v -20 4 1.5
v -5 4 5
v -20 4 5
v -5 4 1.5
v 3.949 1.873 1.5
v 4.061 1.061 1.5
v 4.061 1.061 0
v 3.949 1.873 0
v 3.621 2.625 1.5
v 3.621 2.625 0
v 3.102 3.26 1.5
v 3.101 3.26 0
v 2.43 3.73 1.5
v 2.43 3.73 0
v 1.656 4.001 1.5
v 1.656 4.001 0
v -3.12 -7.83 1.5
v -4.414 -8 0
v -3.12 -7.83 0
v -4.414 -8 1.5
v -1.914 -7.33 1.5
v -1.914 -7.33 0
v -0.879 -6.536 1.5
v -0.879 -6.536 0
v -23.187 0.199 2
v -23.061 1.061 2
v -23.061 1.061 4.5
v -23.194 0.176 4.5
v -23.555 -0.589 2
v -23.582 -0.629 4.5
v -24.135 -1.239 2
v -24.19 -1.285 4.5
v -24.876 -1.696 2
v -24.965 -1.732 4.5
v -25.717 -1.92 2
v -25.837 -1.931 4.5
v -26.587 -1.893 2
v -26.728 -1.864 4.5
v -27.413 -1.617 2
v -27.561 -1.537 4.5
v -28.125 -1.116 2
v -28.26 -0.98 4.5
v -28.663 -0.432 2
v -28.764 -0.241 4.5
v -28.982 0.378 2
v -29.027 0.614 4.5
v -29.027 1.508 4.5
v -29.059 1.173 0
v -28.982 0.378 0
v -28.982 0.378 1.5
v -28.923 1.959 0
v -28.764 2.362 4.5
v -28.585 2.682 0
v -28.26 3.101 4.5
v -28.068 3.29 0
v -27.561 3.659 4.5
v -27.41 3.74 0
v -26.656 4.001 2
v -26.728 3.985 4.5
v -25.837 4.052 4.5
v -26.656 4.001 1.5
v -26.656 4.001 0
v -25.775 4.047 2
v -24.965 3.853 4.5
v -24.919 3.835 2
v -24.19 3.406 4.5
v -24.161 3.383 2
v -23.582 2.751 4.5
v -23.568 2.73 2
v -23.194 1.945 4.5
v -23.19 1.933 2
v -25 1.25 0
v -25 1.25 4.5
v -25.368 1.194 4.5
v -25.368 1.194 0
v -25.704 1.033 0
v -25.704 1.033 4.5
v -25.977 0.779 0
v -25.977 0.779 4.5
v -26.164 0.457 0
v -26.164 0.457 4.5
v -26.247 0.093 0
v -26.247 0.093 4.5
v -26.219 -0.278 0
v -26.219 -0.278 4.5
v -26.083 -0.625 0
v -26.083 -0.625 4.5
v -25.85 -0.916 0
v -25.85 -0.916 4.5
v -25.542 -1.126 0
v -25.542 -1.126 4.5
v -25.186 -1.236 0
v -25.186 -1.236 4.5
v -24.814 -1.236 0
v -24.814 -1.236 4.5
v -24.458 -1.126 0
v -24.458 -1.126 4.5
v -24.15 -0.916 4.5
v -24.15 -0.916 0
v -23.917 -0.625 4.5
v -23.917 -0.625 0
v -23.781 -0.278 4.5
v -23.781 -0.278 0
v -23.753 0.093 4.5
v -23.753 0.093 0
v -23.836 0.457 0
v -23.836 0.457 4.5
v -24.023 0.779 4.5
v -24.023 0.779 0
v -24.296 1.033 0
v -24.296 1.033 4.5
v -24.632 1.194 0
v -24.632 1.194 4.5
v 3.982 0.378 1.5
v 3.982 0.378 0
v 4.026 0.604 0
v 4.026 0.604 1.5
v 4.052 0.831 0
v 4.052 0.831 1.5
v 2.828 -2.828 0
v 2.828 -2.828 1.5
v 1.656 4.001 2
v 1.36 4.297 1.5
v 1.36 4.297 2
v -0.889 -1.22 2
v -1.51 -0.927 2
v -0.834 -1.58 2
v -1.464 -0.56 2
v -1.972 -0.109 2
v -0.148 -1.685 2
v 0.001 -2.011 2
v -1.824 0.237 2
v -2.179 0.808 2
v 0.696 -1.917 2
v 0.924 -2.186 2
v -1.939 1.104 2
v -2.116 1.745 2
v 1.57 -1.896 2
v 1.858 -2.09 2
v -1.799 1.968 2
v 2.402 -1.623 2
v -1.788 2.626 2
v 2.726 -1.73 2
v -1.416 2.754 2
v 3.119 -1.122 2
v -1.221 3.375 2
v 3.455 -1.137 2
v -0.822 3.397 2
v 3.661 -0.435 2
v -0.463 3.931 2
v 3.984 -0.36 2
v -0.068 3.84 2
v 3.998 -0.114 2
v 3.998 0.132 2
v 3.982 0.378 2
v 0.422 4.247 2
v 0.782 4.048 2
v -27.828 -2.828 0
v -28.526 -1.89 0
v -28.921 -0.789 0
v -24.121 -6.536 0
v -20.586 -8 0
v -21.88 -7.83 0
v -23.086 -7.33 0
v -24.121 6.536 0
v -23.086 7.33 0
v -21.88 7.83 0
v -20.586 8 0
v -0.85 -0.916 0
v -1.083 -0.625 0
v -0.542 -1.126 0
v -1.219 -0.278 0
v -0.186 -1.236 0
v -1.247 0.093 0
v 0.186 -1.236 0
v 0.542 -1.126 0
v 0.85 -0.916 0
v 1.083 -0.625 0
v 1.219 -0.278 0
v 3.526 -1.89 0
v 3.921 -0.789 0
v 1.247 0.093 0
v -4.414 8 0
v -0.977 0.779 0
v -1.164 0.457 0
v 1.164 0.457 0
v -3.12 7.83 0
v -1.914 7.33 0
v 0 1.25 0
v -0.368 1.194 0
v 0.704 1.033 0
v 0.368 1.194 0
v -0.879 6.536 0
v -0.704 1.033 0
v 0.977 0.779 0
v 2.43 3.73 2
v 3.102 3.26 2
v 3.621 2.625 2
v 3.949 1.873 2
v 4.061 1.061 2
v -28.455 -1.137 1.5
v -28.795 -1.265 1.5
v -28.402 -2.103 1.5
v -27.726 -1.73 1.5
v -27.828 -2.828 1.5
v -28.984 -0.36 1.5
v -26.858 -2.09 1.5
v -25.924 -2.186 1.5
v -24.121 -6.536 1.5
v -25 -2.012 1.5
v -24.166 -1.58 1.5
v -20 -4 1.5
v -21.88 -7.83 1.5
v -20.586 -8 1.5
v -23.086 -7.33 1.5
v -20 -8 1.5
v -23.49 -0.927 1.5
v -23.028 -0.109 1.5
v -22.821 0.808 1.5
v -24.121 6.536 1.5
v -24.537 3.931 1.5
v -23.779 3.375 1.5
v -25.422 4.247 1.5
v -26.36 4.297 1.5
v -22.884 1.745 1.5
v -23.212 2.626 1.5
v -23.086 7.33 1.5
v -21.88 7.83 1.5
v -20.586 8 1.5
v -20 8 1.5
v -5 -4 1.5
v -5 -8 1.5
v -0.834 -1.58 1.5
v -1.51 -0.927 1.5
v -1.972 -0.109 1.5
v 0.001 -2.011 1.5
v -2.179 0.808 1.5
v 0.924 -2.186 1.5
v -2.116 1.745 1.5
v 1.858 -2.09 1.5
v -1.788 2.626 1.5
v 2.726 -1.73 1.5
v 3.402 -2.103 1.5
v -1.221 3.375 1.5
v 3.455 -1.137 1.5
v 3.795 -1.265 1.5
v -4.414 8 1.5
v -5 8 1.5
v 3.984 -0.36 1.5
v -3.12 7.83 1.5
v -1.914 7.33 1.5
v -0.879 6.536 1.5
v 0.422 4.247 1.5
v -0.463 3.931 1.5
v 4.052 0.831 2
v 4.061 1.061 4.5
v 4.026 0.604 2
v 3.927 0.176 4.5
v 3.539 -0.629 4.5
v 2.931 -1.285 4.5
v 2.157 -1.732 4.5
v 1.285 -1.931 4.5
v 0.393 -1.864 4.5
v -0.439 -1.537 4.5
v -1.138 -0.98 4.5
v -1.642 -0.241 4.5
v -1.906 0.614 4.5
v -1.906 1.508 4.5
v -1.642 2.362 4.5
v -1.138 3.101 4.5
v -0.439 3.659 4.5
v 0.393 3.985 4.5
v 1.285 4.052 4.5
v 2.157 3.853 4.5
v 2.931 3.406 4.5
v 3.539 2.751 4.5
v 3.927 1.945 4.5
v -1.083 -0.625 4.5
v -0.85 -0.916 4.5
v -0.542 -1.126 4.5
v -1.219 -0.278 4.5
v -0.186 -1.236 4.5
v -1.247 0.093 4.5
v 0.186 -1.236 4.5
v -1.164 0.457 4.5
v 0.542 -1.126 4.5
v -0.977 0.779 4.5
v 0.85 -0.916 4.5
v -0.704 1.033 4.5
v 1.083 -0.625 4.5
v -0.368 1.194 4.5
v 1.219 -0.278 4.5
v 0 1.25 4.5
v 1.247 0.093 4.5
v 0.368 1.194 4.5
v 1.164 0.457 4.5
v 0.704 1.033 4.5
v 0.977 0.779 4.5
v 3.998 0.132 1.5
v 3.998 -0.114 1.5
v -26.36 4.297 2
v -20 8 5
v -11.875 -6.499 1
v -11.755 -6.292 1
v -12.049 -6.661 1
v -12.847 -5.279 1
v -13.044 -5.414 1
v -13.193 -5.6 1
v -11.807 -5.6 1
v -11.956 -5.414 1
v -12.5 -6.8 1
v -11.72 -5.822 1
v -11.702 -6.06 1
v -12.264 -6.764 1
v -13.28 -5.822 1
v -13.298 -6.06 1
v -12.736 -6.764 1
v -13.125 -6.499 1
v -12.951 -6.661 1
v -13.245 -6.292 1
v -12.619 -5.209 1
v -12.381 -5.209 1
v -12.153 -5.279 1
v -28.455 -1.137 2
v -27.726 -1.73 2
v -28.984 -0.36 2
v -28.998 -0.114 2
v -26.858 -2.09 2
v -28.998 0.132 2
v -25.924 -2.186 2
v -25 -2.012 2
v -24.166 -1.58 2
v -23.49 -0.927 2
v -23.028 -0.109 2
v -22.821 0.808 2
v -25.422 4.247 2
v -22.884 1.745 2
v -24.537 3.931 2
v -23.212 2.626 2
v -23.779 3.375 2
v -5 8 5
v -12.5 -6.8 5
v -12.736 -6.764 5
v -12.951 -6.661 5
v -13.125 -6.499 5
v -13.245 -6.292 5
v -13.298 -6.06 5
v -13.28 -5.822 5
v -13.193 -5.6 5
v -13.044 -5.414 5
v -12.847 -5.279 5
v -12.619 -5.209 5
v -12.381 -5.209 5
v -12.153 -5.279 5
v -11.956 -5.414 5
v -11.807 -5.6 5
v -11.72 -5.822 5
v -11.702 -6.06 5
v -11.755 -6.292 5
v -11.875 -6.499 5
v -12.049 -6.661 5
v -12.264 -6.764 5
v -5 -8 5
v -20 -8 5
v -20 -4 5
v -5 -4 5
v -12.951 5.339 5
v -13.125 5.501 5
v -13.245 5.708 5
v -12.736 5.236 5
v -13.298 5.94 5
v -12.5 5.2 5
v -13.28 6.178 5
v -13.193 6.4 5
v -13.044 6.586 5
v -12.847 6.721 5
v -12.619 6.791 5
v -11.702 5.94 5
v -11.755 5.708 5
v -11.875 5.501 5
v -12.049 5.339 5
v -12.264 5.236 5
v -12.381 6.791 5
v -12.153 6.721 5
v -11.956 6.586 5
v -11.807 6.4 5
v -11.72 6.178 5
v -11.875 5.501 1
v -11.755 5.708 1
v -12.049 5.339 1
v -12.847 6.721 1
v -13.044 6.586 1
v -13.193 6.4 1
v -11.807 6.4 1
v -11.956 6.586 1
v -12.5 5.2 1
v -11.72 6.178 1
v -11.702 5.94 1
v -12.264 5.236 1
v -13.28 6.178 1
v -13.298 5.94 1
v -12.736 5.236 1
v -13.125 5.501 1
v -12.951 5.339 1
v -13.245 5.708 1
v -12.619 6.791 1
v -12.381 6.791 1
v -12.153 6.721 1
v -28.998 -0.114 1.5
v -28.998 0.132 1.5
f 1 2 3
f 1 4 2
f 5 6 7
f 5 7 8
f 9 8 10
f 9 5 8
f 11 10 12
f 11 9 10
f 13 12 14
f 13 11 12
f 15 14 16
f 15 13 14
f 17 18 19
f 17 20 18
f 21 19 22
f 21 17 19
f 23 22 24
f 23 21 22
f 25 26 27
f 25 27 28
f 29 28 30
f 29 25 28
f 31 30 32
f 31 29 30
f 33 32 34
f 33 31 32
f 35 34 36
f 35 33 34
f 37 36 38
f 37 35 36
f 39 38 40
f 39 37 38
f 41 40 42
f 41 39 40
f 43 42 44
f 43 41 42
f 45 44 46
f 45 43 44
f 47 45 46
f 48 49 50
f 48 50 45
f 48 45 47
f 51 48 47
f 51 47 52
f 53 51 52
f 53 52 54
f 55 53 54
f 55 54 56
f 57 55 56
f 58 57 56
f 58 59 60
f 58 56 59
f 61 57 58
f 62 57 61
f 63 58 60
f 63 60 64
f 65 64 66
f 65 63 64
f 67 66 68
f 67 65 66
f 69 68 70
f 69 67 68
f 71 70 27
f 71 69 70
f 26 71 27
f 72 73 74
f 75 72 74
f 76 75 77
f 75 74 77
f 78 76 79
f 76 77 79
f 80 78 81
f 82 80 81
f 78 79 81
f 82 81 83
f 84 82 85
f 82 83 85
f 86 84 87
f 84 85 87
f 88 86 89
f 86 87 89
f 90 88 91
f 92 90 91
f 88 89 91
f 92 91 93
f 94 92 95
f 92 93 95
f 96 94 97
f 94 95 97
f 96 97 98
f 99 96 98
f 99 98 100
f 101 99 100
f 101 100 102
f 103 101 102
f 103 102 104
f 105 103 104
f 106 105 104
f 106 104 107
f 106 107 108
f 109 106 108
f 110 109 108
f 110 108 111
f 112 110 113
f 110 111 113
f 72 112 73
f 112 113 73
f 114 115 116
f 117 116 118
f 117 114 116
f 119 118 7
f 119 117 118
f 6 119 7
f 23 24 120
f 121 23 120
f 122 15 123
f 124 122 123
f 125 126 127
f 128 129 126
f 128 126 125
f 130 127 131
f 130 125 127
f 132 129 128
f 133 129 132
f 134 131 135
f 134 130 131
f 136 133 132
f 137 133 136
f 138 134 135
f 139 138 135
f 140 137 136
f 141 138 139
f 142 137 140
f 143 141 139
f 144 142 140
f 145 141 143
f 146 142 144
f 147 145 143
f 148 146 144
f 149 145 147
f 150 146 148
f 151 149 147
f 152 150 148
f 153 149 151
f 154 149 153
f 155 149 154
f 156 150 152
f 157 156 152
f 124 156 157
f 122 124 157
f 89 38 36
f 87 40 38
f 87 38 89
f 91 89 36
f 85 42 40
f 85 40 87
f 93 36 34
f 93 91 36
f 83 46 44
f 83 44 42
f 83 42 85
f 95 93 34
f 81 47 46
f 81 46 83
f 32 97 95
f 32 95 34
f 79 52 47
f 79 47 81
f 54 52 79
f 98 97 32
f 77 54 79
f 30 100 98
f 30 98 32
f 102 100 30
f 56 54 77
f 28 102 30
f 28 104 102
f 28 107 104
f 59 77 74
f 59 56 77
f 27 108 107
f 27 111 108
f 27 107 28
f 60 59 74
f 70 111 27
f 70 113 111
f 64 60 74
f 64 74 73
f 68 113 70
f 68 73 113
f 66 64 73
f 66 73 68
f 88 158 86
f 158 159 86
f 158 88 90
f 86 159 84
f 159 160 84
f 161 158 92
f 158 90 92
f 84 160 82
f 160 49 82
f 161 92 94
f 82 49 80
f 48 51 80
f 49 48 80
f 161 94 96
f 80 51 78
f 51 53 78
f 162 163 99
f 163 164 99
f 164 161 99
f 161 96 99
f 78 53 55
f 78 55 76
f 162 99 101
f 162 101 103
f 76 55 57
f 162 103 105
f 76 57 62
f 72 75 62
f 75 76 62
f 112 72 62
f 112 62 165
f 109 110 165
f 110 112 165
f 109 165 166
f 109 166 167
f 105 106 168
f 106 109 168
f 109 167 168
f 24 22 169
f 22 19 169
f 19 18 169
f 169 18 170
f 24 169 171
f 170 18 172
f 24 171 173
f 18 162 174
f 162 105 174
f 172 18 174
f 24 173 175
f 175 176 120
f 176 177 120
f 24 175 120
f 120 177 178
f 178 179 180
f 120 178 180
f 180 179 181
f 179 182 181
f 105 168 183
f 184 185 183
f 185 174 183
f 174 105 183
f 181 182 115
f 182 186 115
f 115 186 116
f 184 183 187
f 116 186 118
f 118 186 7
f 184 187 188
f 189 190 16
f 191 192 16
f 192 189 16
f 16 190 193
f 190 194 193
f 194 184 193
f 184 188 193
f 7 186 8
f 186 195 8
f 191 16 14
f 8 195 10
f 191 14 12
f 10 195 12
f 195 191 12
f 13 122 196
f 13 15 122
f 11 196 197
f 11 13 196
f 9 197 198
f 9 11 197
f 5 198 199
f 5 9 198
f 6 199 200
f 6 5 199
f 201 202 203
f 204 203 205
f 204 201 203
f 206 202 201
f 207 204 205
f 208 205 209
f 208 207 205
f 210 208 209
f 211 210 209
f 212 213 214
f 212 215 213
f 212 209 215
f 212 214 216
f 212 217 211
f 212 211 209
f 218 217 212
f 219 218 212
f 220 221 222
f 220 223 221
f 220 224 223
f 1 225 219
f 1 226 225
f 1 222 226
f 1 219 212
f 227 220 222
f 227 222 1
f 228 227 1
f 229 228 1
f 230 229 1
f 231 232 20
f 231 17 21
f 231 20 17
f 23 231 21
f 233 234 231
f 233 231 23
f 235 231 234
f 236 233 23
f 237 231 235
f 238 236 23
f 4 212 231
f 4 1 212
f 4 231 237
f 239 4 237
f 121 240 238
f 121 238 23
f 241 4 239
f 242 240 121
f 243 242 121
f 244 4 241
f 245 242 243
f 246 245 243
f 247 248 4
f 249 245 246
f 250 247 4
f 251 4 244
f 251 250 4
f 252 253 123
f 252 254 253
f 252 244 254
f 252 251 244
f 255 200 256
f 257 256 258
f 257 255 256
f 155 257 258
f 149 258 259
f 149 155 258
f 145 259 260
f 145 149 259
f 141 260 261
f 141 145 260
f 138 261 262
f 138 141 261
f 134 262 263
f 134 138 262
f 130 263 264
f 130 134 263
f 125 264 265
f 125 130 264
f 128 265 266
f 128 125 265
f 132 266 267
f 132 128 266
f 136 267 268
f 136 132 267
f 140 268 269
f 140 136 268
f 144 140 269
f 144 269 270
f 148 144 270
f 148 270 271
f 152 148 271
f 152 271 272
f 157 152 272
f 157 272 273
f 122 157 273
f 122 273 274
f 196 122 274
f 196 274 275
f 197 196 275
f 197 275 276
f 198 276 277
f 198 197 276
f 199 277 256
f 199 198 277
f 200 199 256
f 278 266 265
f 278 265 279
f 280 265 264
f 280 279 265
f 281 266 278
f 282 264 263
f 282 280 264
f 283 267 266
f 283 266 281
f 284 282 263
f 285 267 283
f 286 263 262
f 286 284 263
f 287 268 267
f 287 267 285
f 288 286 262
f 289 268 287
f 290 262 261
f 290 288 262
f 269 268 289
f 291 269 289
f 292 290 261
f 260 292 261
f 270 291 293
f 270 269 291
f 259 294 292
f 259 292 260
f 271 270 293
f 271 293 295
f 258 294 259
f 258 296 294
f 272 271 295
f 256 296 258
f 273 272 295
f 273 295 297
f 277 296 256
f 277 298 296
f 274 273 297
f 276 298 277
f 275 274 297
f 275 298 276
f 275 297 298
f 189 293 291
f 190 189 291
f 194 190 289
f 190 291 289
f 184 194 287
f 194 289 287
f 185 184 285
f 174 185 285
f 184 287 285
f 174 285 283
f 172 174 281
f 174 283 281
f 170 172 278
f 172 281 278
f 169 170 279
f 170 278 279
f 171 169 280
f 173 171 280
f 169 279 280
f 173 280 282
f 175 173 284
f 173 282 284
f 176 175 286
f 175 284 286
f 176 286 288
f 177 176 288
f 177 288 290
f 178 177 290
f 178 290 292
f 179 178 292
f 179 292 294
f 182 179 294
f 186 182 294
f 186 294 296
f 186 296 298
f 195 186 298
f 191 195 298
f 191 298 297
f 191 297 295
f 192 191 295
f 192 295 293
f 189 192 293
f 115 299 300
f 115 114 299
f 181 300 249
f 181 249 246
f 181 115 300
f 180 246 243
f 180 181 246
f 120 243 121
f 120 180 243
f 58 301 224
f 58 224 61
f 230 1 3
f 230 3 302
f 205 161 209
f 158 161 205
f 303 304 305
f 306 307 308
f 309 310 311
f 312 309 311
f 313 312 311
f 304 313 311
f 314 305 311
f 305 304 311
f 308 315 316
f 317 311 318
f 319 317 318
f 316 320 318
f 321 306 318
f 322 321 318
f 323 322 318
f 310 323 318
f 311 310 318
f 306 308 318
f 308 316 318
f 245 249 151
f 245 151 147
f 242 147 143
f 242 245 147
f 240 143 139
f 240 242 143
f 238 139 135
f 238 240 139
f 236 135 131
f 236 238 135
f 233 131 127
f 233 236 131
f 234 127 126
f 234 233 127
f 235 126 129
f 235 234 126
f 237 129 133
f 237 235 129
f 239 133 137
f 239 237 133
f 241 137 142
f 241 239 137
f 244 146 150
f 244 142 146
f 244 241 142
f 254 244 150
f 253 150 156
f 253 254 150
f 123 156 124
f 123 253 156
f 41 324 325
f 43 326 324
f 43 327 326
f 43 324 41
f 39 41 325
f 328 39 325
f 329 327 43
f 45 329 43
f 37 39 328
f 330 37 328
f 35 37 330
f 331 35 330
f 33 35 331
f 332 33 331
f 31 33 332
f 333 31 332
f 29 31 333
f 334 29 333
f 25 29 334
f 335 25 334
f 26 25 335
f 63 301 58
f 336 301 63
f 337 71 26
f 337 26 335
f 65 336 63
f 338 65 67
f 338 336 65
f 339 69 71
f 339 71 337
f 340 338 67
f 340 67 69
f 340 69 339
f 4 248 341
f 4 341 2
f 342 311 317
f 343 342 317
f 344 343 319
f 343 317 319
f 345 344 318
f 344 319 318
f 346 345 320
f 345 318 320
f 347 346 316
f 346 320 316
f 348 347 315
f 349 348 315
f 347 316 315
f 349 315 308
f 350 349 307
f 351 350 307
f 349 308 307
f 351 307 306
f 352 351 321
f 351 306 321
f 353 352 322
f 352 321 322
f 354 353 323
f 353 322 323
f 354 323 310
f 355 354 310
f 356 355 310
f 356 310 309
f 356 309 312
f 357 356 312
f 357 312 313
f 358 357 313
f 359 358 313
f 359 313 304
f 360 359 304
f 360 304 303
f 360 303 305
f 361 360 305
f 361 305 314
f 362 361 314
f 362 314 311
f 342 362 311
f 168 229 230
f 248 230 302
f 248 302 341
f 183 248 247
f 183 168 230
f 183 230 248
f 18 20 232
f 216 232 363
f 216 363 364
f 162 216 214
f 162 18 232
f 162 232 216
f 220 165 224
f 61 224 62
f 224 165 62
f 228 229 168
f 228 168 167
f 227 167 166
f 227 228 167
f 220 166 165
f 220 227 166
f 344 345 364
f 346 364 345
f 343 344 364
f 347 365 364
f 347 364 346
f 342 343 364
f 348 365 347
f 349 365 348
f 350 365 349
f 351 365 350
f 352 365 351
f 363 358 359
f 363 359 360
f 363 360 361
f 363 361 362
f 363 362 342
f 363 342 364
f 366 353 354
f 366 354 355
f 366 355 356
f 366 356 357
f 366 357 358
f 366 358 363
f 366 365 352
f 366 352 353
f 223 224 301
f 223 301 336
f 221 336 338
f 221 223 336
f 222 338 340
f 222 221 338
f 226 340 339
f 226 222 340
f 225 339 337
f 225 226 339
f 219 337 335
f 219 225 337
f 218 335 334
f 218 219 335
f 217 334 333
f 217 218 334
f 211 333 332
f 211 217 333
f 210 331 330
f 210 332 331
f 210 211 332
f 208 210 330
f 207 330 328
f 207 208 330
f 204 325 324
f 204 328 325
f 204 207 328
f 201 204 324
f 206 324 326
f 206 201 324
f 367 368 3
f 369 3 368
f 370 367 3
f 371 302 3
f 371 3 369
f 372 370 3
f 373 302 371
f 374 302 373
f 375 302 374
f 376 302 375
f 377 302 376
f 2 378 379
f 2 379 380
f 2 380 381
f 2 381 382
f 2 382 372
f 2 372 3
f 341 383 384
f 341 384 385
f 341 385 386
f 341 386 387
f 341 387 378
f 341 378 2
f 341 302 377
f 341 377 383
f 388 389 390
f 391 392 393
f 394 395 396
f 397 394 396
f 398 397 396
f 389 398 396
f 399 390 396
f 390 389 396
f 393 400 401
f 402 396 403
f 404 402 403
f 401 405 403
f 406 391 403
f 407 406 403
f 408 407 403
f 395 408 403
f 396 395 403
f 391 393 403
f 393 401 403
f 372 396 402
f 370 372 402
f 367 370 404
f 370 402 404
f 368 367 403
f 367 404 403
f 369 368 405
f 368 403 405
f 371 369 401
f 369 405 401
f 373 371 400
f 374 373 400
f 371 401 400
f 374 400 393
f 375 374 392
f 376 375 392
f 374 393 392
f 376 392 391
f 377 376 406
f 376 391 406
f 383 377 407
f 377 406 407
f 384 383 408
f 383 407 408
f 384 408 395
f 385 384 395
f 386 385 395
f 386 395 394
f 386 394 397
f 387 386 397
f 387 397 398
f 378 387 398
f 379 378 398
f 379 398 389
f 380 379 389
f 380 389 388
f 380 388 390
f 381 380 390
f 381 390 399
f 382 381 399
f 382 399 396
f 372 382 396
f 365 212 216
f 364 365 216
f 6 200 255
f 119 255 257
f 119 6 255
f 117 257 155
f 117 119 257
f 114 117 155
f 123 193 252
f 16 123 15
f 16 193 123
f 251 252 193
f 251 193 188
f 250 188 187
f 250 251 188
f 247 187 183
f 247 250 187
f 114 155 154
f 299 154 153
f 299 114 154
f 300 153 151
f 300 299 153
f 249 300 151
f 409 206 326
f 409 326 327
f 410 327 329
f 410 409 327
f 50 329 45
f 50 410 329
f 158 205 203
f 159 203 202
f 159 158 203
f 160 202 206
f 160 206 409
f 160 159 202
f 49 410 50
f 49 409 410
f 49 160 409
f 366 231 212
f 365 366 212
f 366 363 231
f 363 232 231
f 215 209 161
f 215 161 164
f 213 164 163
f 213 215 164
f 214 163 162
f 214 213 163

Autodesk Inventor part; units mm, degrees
ref_plane "YZ Plane" through (0, 0, 0) normal (1, 0, 0) x (0, 1, 0)
ref_plane "XZ Plane" through (0, 0, 0) normal (0, 1, 0) x (-1, 0, 0)
ref_plane "XY Plane" through (0, 0, 0) normal (0, 0, 1) x (1, 0, 0)
sketch "axes" plane through (0, 0, 0) normal (0, 0, 1) x (1, 0, 0)
  point P0 (0, 0)
  point P1 (0, 0)
  point P2 (-25, 0)
  dimension "d0" = 25
sketch "Sketch2" plane through (0, 0, 0) normal (0, 0, 1) x (1, 0, 0)
  circle A0 centre (-25, 0) radius 4
  circle A1 centre (0, 0) radius 4
  line L0 (-22.6569, 8) -> (-2.3431, 8)
  line L1 (-2.3431, -8) -> (-22.6569, -8)
  line L2 (-22.6569, -8) -> (-27.8284, -2.8284)
  line L3 (-22.6569, 8) -> (-27.8284, 2.8284)
  line L4 (-2.3431, 8) -> (2.8284, 2.8284)
  line L5 (-2.3431, -8) -> (2.8284, -2.8284)
  line L6 (-25, 0) -> (0, 0) construction
  dimension "d1" = 8
  dimension "d2" = 8
  dimension "d3" = 16
  dimension "d4" = 45
  dimension "d5" = 45
extrude "baseplate" add sketch "Sketch2" along normal blind 1.5
sketch "Sketch3" plane through (0, 0, 1.5) normal (0, 0, 1) x (1, 0, 0)
  arc A0 (-27.8284, 2.8284) -> (-27.8284, -2.8284) centre (-25, 0) ccw projected
  line L0 (-27.8284, -2.8284) -> (-22.6569, -8) projected
  line L1 (-22.6569, -8) -> (-2.3431, -8) projected
  line L2 (-2.3431, -8) -> (2.8284, -2.8284) projected
  arc A1 (2.8284, -2.8284) -> (2.8284, 2.8284) centre (0, 0) ccw projected
  line L3 (2.8284, 2.8284) -> (-2.3431, 8) projected
  line L4 (-2.3431, 8) -> (-22.6569, 8) projected
  line L5 (-22.6569, 8) -> (-27.8284, 2.8284) projected
  line L6 (-20, 8) -> (-5, 8)
  line L7 (-5, 8) -> (-5, 4)
  line L8 (-5, 4) -> (-20, 4)
  line L9 (-20, 4) -> (-20, 8)
  line L10 (-20, -8) -> (-5, -8)
  line L11 (-5, -8) -> (-5, -4)
  line L12 (-5, -4) -> (-20, -4)
  line L13 (-20, -4) -> (-20, -8)
  dimension "d8" = 4
  dimension "d9" = 4
  dimension "d10" = 5
  dimension "d11" = 5
  dimension "d12" = 5
  dimension "d13" = 5
extrude "walls" add sketch "Sketch3" along normal blind 3.5 contours L4 L7 L8 L9 | L13 L12 L11 L1
sketch "Sketch5" plane through (0, 0, 5) normal (0, 0, 1) x (1, 0, 0)
  line L0 (-20, -8) -> (-5, -8) projected
  line L1 (-5, -8) -> (-5, -4) projected
  line L2 (-5, -4) -> (-20, -4) projected
  line L3 (-20, -4) -> (-20, -8) projected
  line L4 (-20, 8) -> (-20, 4) projected
  line L5 (-20, 4) -> (-5, 4) projected
  line L6 (-5, 4) -> (-5, 8) projected
  line L7 (-5, 8) -> (-20, 8) projected
  line L8 (-5, -6) -> (-20, -6) construction
  line L9 (-5, 6) -> (-20, 6) construction
  point P0 (0, 0)
  point P1 (-12.5, -6)
  point P2 (-12.5, 6)
hole "mounting" at (-12.5, -6, 5) at (-12.5, 6, 5) direction (0, 0, -1) diameter 1.6 depth 4
sketch "Sketch6" plane through (0, 0, 1.5) normal (0, 0, 1) x (1, 0, 0)
  circle A0 centre (1.0607, 1.0607) radius 3
  line L0 (0, 0) -> (1.0607, 1.0607) construction
  line L1 (0, 0) -> (7.1773, 0) construction
  dimension "d30" = 45
  dimension "d31" = 1.5
  dimension "d32" = 6
extrude "pip springy" add sketch "Sketch6" along normal blind 3 and the other way blind 1.5
sketch "Sketch10" plane through (0, 0, 1.5) normal (0, 0, 1) x (1, 0, 0)
  circle A0 centre (1.0607, 1.0607) radius 3 projected
  line L0 (1.6558, 4.001) -> (-2.3431, 8) projected
  arc A1 (2.8284, -2.8284) -> (3.9821, 0.3784) centre (0, 0) ccw projected
  arc A2 (1.36, 4.2968) -> (3.9838, -0.3599) centre (1.0607, 1.0607) ccw
  dimension "d50" = 6.5
extrude "Extrusion7" add sketch "Sketch10" along normal blind 0.5
sketch "Sketch8" plane through (0, 0, 1.5) normal (0, 0, 1) x (1, 0, 0)
  line L0 (-30.1045, 0) -> (-25, 0) construction
  line L1 (-25, 0) -> (-29.2709, 4.2709) construction
  circle A0 centre (-26.0607, 1.0607) radius 3
  point P0 (0, 0)
  dimension "d38" = 45
  dimension "d39" = 6
  dimension "d40" = 1.5
extrude "dip springy" add sketch "Sketch8" along normal blind 3 and the other way blind 1.5
sketch "Sketch9" plane through (0, 0, 1.5) normal (0, 0, 1) x (1, 0, 0)
  arc A0 (-28.9821, 0.3784) -> (-26.6558, 4.001) centre (-26.0607, 1.0607) ccw projected
  arc A1 (-28.9838, -0.3599) -> (-26.36, 4.2968) centre (-26.0607, 1.0607) ccw
  line L0 (-22.6569, 8) -> (-26.6558, 4.001) projected
  arc A2 (-28.9821, 0.3784) -> (-27.8284, -2.8284) centre (-25, 0) ccw projected
  point P0 (0, 0)
  dimension "d43" = 6.5
extrude "Extrusion6" add sketch "Sketch9" along normal blind 0.5
sketch "Sketch4" plane through (0, 0, 0) normal (0, 0, -1) x (-1, 0, 0)
  point P0 (25, 0)
  point P1 (0, 0)
hole "joints" at (0, 0, 0) at (-25, 0, 0) direction (0, 0, 1) diameter 2.5 end through all
fillet "Fillet1" radius 5 4 edges at (-2.3431, -8, 0.75) (-22.6569, -8, 0.75) (-22.6569, 8, 0.75) (-2.3431, 8, 0.75)
equation "\"d0\" = PIP_DIP_length"
equation "\"d31\" = PIP_spring_arm"
equation "\"d40\" = DIP_spring_arm"
equation "\"PIP_DIP_length\" = F4_PIP_DIP_length"
equation "\"PIP_spring_arm\" = F4_PIP_spring_arm"
equation "\"DIP_spring_arm\" = F4_DIP_spring_arm"
equation "\"F4_PIP_DIP_length\" = 25"
equation "\"F4_PIP_spring_arm\" = 1.5"
equation "\"F4_DIP_spring_arm\" = 1.5"
properties part number "phalanx 2 R F4"
